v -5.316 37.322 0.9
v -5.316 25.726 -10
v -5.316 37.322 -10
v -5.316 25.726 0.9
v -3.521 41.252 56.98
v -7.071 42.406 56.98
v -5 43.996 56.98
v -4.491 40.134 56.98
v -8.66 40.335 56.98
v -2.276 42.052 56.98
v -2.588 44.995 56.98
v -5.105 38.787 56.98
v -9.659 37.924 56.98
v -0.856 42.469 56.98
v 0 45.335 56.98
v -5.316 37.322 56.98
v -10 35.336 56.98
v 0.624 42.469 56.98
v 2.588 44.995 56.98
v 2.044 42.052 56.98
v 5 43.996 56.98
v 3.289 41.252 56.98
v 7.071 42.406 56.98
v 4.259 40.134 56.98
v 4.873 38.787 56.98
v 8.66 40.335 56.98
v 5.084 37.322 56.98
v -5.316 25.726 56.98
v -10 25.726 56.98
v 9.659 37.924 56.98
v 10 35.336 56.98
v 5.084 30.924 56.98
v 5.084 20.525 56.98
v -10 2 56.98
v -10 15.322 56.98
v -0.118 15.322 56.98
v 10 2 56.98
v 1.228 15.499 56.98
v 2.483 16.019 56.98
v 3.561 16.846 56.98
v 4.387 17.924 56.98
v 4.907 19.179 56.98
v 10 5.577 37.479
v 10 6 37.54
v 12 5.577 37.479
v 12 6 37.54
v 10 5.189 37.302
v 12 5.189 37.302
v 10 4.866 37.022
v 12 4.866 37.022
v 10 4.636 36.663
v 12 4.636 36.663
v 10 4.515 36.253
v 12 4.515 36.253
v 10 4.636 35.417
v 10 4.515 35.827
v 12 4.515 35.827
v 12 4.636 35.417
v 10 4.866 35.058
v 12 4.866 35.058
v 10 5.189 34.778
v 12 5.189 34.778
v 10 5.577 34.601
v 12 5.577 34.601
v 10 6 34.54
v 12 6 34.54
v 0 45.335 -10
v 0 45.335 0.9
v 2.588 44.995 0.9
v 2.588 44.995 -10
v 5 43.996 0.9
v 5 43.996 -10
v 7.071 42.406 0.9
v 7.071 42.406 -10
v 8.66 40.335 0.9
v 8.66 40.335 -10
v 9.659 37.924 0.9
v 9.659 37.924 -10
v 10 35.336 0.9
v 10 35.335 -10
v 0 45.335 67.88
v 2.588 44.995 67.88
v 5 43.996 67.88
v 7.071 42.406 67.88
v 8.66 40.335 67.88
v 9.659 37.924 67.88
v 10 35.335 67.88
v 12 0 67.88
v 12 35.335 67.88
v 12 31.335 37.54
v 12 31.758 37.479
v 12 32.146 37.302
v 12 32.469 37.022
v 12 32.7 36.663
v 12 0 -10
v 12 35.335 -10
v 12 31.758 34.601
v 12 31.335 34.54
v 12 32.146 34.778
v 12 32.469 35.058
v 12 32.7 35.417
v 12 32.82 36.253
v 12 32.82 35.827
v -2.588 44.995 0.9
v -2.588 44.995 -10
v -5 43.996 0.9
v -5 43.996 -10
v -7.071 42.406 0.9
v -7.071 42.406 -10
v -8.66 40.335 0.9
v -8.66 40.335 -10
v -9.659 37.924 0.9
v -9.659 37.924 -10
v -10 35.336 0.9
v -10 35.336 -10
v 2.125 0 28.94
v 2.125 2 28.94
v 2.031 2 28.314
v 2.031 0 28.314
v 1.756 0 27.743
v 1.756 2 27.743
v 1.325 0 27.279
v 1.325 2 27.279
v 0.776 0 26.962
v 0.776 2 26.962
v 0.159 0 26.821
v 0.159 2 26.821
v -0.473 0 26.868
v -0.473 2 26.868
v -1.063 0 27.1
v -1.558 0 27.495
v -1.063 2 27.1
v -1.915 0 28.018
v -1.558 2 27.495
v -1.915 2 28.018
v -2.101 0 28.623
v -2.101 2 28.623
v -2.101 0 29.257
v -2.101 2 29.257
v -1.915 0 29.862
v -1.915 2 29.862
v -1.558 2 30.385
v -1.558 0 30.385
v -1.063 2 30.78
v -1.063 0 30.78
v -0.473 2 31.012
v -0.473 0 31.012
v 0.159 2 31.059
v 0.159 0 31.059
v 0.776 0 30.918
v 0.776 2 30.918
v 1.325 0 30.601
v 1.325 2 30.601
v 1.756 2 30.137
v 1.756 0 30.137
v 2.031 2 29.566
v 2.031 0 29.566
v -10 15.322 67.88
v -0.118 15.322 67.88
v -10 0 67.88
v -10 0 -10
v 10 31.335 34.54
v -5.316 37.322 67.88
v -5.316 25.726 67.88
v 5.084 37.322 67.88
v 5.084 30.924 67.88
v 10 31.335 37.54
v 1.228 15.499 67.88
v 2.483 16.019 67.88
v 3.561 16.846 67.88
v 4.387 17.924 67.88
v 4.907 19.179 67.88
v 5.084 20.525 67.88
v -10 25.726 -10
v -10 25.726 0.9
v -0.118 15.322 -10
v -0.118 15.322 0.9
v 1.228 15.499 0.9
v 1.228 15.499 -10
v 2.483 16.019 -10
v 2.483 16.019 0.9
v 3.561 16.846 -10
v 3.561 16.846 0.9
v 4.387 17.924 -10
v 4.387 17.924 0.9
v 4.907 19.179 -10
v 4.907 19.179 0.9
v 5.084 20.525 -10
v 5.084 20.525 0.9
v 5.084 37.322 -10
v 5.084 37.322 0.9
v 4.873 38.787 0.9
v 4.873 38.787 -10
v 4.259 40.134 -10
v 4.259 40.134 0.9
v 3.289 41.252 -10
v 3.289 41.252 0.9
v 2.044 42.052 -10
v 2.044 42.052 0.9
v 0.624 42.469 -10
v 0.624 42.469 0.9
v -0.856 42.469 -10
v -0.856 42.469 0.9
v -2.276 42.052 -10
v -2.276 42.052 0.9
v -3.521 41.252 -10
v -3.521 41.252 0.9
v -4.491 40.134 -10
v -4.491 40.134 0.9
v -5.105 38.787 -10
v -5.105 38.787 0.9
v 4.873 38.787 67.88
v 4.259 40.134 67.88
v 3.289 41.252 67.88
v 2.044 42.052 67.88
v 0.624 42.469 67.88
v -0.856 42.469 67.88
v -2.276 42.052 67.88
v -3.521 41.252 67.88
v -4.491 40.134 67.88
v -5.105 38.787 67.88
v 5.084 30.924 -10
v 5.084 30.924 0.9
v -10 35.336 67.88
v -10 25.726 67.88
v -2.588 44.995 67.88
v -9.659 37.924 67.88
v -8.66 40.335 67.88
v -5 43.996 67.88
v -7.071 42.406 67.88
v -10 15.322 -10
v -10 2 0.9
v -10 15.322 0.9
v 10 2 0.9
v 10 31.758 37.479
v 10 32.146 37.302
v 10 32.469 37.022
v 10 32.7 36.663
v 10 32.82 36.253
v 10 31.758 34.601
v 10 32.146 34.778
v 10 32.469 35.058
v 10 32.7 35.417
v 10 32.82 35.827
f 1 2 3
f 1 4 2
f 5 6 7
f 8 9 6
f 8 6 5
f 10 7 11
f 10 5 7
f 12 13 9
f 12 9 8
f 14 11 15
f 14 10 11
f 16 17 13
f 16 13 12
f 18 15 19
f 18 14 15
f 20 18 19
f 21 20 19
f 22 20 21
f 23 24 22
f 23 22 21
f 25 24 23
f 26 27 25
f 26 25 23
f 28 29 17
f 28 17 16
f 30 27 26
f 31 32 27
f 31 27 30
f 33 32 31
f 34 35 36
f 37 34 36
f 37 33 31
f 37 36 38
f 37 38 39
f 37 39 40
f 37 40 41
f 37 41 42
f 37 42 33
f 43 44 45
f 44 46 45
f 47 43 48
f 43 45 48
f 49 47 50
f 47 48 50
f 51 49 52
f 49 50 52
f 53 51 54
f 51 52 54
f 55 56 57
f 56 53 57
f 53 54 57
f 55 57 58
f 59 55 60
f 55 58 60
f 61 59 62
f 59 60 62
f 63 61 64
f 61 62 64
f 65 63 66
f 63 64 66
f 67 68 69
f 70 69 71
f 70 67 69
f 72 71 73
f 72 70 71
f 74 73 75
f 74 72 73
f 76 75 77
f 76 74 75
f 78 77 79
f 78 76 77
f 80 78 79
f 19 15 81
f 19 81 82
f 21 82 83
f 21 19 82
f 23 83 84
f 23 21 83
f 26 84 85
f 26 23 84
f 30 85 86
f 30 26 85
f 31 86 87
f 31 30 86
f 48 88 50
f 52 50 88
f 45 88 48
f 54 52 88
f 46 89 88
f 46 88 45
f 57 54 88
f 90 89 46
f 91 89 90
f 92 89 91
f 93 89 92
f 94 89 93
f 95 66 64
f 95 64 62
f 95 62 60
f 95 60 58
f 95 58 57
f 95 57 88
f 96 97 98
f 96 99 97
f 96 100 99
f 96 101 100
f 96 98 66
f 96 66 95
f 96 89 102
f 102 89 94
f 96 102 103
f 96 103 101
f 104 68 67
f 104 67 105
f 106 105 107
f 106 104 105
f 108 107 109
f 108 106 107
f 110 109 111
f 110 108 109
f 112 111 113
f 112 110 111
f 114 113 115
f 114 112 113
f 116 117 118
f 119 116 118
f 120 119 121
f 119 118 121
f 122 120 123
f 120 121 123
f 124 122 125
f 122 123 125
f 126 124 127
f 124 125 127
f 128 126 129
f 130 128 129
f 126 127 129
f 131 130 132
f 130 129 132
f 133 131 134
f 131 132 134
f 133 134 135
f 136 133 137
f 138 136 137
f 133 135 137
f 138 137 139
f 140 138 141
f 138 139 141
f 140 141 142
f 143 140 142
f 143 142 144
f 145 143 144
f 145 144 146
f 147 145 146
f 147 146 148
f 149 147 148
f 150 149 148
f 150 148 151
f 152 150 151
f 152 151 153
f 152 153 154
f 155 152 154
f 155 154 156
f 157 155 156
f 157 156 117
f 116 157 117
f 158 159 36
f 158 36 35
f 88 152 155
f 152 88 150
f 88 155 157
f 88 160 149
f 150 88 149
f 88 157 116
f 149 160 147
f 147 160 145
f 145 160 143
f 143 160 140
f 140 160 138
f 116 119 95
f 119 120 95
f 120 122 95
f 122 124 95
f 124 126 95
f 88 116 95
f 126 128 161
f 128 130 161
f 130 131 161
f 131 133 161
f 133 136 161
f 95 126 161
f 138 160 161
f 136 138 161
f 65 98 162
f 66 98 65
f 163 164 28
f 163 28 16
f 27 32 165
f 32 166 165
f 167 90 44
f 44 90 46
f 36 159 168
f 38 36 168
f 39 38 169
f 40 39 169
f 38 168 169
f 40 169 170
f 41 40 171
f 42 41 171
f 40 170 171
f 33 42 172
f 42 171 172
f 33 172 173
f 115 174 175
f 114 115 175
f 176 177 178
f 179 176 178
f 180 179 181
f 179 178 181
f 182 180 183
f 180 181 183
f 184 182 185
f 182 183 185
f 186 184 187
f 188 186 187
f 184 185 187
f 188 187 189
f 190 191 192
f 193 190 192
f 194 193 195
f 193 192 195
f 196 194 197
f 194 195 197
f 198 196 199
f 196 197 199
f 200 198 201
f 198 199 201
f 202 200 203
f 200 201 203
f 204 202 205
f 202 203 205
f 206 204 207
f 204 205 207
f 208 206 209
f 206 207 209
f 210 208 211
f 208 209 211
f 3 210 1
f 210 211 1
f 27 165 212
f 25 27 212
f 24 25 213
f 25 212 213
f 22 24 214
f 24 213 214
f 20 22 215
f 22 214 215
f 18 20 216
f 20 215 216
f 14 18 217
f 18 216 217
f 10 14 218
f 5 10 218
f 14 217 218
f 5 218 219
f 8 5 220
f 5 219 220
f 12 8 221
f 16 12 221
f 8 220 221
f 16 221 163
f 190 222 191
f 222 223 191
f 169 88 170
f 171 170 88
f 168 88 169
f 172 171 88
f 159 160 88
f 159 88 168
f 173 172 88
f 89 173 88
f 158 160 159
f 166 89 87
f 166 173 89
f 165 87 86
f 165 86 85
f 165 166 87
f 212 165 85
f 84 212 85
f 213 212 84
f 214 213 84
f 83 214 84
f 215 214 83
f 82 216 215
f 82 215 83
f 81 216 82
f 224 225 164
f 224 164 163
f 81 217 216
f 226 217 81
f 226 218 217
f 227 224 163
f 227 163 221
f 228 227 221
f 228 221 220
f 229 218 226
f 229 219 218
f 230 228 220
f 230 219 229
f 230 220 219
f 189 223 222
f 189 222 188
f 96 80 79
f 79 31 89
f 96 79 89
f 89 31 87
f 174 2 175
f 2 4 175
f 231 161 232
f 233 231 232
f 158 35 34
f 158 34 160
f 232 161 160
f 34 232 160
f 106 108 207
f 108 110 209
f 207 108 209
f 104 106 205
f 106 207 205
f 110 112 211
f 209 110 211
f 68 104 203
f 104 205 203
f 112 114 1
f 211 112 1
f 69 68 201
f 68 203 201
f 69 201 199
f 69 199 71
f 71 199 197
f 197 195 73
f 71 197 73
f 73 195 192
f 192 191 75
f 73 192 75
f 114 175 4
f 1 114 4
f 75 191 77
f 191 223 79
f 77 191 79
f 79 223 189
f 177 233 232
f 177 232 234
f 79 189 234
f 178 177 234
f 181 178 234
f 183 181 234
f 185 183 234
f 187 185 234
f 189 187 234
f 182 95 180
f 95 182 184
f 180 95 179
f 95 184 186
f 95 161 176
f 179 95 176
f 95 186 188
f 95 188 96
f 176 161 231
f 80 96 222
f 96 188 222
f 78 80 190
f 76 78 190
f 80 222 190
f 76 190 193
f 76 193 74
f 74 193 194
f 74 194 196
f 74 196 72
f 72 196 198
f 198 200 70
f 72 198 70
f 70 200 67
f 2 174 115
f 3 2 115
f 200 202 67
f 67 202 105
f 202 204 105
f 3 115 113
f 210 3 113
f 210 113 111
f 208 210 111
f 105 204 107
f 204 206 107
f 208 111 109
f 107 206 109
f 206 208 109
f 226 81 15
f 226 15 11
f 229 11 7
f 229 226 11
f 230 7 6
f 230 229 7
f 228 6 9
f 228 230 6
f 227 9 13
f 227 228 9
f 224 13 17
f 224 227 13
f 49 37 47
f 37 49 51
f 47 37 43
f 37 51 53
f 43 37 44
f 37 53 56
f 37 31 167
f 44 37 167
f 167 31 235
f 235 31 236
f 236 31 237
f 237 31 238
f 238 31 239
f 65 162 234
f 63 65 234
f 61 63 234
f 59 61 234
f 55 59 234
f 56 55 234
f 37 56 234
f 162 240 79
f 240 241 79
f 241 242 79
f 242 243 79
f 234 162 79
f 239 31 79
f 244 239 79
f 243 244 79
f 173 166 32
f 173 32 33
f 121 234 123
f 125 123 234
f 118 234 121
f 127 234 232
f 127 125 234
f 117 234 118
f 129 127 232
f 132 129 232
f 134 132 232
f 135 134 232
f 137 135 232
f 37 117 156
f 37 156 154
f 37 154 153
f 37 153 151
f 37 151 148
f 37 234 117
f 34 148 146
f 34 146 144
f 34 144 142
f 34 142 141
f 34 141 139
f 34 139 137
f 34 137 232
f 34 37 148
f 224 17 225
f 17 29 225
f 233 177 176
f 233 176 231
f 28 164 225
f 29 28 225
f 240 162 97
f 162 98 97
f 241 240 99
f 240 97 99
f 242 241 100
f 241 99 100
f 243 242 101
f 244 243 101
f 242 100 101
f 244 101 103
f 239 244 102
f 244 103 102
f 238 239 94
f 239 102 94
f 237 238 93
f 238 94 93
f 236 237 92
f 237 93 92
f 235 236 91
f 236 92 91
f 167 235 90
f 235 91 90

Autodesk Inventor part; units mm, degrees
ref_plane "YZ Plane" through (0, 0, 0) normal (1, 0, 0) x (0, 1, 0)
ref_plane "XZ Plane" through (0, 0, 0) normal (0, 1, 0) x (-1, 0, 0)
ref_plane "XY Plane" through (0, 0, 0) normal (0, 0, 1) x (1, 0, 0)
sketch "Sketch1" plane through (0, 0, 0) normal (0, 1, 0) x (-1, 0, 0)
  line L0 (10, 67.88) -> (-10, 67.88)
  line L1 (-10, 67.88) -> (-10, -10)
  line L2 (-10, -10) -> (10, -10)
  line L3 (10, -10) -> (10, 67.88)
  point P0 (0, 0)
  dimension "d0" = 20
  dimension "d1" = 77.88
extrude "Extrusion1" add sketch "Sketch1" along normal blind 2
sketch "Sketch2" plane through (0, 2, 0) normal (0, 1, 0) x (1, 0, 0)
  line L0 (-10, -67.88) -> (10, -67.88) projected
  line L1 (0, -67.88) -> (-6.35, -67.88)
  line L2 (-6.35, -56.98) -> (6.35, -56.98)
  line L3 (6.35, -67.88) -> (0, -67.88)
  line L4 (10, 10) -> (-10, 10) projected
  line L5 (-6.35, -0.9) -> (6.35, -0.9)
  line L6 (-6.35, 10) -> (6.35, 10)
  line L7 (-6.35, -67.88) -> (-10, -67.88)
  line L8 (-10, 10) -> (-10, -67.88) projected
  line L9 (-10, -56.98) -> (-6.35, -56.98)
  line L10 (6.35, -67.88) -> (10, -67.88)
  line L11 (10, -67.88) -> (10, 10) projected
  line L12 (10, -56.98) -> (6.35, -56.98)
  line L13 (6.35, -0.9) -> (10, -0.9)
  line L14 (10, 10) -> (6.35, 10)
  line L15 (10, -0.9) -> (10, 10)
  line L16 (10, -67.88) -> (10, -56.98)
  line L17 (-10, -67.88) -> (-10, -56.98)
  line L18 (-6.35, -0.9) -> (-10, -0.9)
  line L19 (-10, -0.9) -> (-10, 10)
  line L20 (-10, 10) -> (-6.35, 10)
  point P0 (0, 0)
  dimension "d4" = 6.35
  dimension "d5" = 10.9
  dimension "d6" = 12.7
  dimension "d7" = 10.9
extrude "Extrusion2" add sketch "Sketch2" along normal blind 43.3354 contours L8 L9 L2 L12 L11 L0 | L8 L4 L11 L13 L5 L18
sketch "Sketch9" plane through (-10, 0, 67.88) normal (0, 0, 1) x (1, 0, 0)
  arc A0 (15.084, 37.3223) -> (4.684, 37.3223) centre (9.884, 37.3223) ccw
  line L0 (15.084, 30.9243) -> (15.084, 37.3223)
  line L1 (4.684, 36.1247) -> (4.684, 37.3223)
  arc A1 (15.084, 37.3223) -> (4.684, 37.3223) centre (9.884, 37.3223) ccw
  line L2 (4.684, 37.3223) -> (4.684, 30.9247)
  line L3 (9.8815, 15.3222) -> (-0.0013, 15.3222)
  line L4 (-0.0013, 25.726) -> (-0.0013, 15.3222)
  line L5 (4.684, 30.9247) -> (4.684, 25.726)
  line L6 (15.084, 30.9243) -> (15.0845, 20.5254)
  arc A2 (15.084, 30.9243) -> (15.084, 30.9251) centre (9.884, 30.9244) ccw
  line L7 (4.684, 25.726) -> (-0.0013, 25.726)
  arc A3 (9.8815, 15.3222) -> (15.0845, 20.5254) centre (9.8815, 20.5252) ccw
  line L8 (0, 0) -> (20, 0) projected
  line L9 (0, 45.3354) -> (20, 45.3354) projected
  point P0 (10, 0)
  point P1 (2.3413, 25.726)
  point P2 (15.084, 30.9247)
  point P3 (9.884, 42.5223)
  point P4 (-0.0013, 20.5241)
  point P5 (10, 45.3354)
  dimension "d76" = 15.3222
  dimension "d77" = 10.4039
  dimension "d78" = 10.4
  dimension "d79" = 27.2001
  dimension "d80" = 15.0858
  dimension "d81" = 8.0131
fillet "Fillet4" radius 10 4 edges at (10, 45.3354, 62.43) (-10, 45.3354, 62.43) (-10, 45.3354, -4.55) (10, 45.3354, -4.55)
sketch "Sketch10" plane through (0, 2, 0) normal (0, 1, 0) x (1, 0, 0)
  line L0 (10, -67.88) -> (-10, -67.88) projected
  line L1 (-10, 10) -> (10, 10) projected
  line L2 (10, -56.98) -> (10, -0.9) projected
  line L3 (-10, -0.9) -> (-10, -56.98) projected
  line L4 (10, -28.94) -> (-10, -28.94)
  circle A0 centre (0, -28.94) radius 2.125
  point P0 (0, 0)
  dimension "d53" = 77.88
  dimension "d54" = 4.25
extrude "Extrusion10" cut sketch "Sketch10" against normal blind 2
extrude "Extrusion11" cut sketch "Sketch9" against normal through all
sketch "Sketch11" plane through (10, 0, 67.88) normal (1, 0, 0) x (0, 0, -1)
  line L0 (0, 0) -> (0, 15.3222) projected
  line L1 (77.88, 25.726) -> (77.88, 35.3354) projected
  line L2 (0, 0) -> (77.88, 0)
  line L3 (77.88, 0) -> (77.88, 35.3354)
  line L4 (77.88, 35.3354) -> (0, 35.3354)
  line L5 (0, 35.3354) -> (0, 0)
  point P0 (67.88, 0)
extrude "Extrusion12" add sketch "Sketch11" along normal blind 2
sketch "Sketch12" plane through (12, 0, 67.88) normal (1, 0, 0) x (0, 0, -1)
  line L0 (10.9, 35.3354) -> (0, 35.3354) projected
  line L1 (77.88, 25.726) -> (77.88, 35.3354) projected
  line L2 (0, 35.3354) -> (77.88, 35.3354)
  line L3 (77.88, 35.3354) -> (0, 35.3354) projected
  line L4 (38.94, 35.3354) -> (64.34, 35.3354)
  line L5 (38.94, 35.3354) -> (13.54, 35.3354)
  line L6 (77.88, 0) -> (0, 0) projected
  line L7 (13.54, 35.3354) -> (64.34, 35.3354)
  line L8 (64.34, 35.3354) -> (64.34, 0)
  line L9 (64.34, 0) -> (13.54, 0)
  line L10 (13.54, 0) -> (13.54, 35.3354)
  line L11 (13.54, 0) -> (31.84, 0)
  line L12 (31.84, 0) -> (31.84, 6)
  arc A0 (33.34, 31.3354) -> (30.34, 31.3354) centre (31.84, 31.3354) ccw
  arc A1 (30.34, 6) -> (33.34, 6) centre (31.84, 6) ccw
  line L13 (30.34, 31.3354) -> (30.34, 6)
  line L14 (33.34, 31.3354) -> (33.34, 6)
  line L15 (31.84, 31.3354) -> (13.54, 31.3354)
  point P0 (67.88, 0)
  dimension "d65" = 25.4
  dimension "d66" = 25.4
  dimension "d67" = 50.8
  dimension "d68" = 18.3
  dimension "d69" = 6
  dimension "d71" = 3
  dimension "d72" = 3
  dimension "d75" = 18.3
extrude "Extrusion13" cut sketch "Sketch12" against normal blind 2 contours A0 L14 A1 L13
properties part number "6 Backet Adjustment 3.0"
